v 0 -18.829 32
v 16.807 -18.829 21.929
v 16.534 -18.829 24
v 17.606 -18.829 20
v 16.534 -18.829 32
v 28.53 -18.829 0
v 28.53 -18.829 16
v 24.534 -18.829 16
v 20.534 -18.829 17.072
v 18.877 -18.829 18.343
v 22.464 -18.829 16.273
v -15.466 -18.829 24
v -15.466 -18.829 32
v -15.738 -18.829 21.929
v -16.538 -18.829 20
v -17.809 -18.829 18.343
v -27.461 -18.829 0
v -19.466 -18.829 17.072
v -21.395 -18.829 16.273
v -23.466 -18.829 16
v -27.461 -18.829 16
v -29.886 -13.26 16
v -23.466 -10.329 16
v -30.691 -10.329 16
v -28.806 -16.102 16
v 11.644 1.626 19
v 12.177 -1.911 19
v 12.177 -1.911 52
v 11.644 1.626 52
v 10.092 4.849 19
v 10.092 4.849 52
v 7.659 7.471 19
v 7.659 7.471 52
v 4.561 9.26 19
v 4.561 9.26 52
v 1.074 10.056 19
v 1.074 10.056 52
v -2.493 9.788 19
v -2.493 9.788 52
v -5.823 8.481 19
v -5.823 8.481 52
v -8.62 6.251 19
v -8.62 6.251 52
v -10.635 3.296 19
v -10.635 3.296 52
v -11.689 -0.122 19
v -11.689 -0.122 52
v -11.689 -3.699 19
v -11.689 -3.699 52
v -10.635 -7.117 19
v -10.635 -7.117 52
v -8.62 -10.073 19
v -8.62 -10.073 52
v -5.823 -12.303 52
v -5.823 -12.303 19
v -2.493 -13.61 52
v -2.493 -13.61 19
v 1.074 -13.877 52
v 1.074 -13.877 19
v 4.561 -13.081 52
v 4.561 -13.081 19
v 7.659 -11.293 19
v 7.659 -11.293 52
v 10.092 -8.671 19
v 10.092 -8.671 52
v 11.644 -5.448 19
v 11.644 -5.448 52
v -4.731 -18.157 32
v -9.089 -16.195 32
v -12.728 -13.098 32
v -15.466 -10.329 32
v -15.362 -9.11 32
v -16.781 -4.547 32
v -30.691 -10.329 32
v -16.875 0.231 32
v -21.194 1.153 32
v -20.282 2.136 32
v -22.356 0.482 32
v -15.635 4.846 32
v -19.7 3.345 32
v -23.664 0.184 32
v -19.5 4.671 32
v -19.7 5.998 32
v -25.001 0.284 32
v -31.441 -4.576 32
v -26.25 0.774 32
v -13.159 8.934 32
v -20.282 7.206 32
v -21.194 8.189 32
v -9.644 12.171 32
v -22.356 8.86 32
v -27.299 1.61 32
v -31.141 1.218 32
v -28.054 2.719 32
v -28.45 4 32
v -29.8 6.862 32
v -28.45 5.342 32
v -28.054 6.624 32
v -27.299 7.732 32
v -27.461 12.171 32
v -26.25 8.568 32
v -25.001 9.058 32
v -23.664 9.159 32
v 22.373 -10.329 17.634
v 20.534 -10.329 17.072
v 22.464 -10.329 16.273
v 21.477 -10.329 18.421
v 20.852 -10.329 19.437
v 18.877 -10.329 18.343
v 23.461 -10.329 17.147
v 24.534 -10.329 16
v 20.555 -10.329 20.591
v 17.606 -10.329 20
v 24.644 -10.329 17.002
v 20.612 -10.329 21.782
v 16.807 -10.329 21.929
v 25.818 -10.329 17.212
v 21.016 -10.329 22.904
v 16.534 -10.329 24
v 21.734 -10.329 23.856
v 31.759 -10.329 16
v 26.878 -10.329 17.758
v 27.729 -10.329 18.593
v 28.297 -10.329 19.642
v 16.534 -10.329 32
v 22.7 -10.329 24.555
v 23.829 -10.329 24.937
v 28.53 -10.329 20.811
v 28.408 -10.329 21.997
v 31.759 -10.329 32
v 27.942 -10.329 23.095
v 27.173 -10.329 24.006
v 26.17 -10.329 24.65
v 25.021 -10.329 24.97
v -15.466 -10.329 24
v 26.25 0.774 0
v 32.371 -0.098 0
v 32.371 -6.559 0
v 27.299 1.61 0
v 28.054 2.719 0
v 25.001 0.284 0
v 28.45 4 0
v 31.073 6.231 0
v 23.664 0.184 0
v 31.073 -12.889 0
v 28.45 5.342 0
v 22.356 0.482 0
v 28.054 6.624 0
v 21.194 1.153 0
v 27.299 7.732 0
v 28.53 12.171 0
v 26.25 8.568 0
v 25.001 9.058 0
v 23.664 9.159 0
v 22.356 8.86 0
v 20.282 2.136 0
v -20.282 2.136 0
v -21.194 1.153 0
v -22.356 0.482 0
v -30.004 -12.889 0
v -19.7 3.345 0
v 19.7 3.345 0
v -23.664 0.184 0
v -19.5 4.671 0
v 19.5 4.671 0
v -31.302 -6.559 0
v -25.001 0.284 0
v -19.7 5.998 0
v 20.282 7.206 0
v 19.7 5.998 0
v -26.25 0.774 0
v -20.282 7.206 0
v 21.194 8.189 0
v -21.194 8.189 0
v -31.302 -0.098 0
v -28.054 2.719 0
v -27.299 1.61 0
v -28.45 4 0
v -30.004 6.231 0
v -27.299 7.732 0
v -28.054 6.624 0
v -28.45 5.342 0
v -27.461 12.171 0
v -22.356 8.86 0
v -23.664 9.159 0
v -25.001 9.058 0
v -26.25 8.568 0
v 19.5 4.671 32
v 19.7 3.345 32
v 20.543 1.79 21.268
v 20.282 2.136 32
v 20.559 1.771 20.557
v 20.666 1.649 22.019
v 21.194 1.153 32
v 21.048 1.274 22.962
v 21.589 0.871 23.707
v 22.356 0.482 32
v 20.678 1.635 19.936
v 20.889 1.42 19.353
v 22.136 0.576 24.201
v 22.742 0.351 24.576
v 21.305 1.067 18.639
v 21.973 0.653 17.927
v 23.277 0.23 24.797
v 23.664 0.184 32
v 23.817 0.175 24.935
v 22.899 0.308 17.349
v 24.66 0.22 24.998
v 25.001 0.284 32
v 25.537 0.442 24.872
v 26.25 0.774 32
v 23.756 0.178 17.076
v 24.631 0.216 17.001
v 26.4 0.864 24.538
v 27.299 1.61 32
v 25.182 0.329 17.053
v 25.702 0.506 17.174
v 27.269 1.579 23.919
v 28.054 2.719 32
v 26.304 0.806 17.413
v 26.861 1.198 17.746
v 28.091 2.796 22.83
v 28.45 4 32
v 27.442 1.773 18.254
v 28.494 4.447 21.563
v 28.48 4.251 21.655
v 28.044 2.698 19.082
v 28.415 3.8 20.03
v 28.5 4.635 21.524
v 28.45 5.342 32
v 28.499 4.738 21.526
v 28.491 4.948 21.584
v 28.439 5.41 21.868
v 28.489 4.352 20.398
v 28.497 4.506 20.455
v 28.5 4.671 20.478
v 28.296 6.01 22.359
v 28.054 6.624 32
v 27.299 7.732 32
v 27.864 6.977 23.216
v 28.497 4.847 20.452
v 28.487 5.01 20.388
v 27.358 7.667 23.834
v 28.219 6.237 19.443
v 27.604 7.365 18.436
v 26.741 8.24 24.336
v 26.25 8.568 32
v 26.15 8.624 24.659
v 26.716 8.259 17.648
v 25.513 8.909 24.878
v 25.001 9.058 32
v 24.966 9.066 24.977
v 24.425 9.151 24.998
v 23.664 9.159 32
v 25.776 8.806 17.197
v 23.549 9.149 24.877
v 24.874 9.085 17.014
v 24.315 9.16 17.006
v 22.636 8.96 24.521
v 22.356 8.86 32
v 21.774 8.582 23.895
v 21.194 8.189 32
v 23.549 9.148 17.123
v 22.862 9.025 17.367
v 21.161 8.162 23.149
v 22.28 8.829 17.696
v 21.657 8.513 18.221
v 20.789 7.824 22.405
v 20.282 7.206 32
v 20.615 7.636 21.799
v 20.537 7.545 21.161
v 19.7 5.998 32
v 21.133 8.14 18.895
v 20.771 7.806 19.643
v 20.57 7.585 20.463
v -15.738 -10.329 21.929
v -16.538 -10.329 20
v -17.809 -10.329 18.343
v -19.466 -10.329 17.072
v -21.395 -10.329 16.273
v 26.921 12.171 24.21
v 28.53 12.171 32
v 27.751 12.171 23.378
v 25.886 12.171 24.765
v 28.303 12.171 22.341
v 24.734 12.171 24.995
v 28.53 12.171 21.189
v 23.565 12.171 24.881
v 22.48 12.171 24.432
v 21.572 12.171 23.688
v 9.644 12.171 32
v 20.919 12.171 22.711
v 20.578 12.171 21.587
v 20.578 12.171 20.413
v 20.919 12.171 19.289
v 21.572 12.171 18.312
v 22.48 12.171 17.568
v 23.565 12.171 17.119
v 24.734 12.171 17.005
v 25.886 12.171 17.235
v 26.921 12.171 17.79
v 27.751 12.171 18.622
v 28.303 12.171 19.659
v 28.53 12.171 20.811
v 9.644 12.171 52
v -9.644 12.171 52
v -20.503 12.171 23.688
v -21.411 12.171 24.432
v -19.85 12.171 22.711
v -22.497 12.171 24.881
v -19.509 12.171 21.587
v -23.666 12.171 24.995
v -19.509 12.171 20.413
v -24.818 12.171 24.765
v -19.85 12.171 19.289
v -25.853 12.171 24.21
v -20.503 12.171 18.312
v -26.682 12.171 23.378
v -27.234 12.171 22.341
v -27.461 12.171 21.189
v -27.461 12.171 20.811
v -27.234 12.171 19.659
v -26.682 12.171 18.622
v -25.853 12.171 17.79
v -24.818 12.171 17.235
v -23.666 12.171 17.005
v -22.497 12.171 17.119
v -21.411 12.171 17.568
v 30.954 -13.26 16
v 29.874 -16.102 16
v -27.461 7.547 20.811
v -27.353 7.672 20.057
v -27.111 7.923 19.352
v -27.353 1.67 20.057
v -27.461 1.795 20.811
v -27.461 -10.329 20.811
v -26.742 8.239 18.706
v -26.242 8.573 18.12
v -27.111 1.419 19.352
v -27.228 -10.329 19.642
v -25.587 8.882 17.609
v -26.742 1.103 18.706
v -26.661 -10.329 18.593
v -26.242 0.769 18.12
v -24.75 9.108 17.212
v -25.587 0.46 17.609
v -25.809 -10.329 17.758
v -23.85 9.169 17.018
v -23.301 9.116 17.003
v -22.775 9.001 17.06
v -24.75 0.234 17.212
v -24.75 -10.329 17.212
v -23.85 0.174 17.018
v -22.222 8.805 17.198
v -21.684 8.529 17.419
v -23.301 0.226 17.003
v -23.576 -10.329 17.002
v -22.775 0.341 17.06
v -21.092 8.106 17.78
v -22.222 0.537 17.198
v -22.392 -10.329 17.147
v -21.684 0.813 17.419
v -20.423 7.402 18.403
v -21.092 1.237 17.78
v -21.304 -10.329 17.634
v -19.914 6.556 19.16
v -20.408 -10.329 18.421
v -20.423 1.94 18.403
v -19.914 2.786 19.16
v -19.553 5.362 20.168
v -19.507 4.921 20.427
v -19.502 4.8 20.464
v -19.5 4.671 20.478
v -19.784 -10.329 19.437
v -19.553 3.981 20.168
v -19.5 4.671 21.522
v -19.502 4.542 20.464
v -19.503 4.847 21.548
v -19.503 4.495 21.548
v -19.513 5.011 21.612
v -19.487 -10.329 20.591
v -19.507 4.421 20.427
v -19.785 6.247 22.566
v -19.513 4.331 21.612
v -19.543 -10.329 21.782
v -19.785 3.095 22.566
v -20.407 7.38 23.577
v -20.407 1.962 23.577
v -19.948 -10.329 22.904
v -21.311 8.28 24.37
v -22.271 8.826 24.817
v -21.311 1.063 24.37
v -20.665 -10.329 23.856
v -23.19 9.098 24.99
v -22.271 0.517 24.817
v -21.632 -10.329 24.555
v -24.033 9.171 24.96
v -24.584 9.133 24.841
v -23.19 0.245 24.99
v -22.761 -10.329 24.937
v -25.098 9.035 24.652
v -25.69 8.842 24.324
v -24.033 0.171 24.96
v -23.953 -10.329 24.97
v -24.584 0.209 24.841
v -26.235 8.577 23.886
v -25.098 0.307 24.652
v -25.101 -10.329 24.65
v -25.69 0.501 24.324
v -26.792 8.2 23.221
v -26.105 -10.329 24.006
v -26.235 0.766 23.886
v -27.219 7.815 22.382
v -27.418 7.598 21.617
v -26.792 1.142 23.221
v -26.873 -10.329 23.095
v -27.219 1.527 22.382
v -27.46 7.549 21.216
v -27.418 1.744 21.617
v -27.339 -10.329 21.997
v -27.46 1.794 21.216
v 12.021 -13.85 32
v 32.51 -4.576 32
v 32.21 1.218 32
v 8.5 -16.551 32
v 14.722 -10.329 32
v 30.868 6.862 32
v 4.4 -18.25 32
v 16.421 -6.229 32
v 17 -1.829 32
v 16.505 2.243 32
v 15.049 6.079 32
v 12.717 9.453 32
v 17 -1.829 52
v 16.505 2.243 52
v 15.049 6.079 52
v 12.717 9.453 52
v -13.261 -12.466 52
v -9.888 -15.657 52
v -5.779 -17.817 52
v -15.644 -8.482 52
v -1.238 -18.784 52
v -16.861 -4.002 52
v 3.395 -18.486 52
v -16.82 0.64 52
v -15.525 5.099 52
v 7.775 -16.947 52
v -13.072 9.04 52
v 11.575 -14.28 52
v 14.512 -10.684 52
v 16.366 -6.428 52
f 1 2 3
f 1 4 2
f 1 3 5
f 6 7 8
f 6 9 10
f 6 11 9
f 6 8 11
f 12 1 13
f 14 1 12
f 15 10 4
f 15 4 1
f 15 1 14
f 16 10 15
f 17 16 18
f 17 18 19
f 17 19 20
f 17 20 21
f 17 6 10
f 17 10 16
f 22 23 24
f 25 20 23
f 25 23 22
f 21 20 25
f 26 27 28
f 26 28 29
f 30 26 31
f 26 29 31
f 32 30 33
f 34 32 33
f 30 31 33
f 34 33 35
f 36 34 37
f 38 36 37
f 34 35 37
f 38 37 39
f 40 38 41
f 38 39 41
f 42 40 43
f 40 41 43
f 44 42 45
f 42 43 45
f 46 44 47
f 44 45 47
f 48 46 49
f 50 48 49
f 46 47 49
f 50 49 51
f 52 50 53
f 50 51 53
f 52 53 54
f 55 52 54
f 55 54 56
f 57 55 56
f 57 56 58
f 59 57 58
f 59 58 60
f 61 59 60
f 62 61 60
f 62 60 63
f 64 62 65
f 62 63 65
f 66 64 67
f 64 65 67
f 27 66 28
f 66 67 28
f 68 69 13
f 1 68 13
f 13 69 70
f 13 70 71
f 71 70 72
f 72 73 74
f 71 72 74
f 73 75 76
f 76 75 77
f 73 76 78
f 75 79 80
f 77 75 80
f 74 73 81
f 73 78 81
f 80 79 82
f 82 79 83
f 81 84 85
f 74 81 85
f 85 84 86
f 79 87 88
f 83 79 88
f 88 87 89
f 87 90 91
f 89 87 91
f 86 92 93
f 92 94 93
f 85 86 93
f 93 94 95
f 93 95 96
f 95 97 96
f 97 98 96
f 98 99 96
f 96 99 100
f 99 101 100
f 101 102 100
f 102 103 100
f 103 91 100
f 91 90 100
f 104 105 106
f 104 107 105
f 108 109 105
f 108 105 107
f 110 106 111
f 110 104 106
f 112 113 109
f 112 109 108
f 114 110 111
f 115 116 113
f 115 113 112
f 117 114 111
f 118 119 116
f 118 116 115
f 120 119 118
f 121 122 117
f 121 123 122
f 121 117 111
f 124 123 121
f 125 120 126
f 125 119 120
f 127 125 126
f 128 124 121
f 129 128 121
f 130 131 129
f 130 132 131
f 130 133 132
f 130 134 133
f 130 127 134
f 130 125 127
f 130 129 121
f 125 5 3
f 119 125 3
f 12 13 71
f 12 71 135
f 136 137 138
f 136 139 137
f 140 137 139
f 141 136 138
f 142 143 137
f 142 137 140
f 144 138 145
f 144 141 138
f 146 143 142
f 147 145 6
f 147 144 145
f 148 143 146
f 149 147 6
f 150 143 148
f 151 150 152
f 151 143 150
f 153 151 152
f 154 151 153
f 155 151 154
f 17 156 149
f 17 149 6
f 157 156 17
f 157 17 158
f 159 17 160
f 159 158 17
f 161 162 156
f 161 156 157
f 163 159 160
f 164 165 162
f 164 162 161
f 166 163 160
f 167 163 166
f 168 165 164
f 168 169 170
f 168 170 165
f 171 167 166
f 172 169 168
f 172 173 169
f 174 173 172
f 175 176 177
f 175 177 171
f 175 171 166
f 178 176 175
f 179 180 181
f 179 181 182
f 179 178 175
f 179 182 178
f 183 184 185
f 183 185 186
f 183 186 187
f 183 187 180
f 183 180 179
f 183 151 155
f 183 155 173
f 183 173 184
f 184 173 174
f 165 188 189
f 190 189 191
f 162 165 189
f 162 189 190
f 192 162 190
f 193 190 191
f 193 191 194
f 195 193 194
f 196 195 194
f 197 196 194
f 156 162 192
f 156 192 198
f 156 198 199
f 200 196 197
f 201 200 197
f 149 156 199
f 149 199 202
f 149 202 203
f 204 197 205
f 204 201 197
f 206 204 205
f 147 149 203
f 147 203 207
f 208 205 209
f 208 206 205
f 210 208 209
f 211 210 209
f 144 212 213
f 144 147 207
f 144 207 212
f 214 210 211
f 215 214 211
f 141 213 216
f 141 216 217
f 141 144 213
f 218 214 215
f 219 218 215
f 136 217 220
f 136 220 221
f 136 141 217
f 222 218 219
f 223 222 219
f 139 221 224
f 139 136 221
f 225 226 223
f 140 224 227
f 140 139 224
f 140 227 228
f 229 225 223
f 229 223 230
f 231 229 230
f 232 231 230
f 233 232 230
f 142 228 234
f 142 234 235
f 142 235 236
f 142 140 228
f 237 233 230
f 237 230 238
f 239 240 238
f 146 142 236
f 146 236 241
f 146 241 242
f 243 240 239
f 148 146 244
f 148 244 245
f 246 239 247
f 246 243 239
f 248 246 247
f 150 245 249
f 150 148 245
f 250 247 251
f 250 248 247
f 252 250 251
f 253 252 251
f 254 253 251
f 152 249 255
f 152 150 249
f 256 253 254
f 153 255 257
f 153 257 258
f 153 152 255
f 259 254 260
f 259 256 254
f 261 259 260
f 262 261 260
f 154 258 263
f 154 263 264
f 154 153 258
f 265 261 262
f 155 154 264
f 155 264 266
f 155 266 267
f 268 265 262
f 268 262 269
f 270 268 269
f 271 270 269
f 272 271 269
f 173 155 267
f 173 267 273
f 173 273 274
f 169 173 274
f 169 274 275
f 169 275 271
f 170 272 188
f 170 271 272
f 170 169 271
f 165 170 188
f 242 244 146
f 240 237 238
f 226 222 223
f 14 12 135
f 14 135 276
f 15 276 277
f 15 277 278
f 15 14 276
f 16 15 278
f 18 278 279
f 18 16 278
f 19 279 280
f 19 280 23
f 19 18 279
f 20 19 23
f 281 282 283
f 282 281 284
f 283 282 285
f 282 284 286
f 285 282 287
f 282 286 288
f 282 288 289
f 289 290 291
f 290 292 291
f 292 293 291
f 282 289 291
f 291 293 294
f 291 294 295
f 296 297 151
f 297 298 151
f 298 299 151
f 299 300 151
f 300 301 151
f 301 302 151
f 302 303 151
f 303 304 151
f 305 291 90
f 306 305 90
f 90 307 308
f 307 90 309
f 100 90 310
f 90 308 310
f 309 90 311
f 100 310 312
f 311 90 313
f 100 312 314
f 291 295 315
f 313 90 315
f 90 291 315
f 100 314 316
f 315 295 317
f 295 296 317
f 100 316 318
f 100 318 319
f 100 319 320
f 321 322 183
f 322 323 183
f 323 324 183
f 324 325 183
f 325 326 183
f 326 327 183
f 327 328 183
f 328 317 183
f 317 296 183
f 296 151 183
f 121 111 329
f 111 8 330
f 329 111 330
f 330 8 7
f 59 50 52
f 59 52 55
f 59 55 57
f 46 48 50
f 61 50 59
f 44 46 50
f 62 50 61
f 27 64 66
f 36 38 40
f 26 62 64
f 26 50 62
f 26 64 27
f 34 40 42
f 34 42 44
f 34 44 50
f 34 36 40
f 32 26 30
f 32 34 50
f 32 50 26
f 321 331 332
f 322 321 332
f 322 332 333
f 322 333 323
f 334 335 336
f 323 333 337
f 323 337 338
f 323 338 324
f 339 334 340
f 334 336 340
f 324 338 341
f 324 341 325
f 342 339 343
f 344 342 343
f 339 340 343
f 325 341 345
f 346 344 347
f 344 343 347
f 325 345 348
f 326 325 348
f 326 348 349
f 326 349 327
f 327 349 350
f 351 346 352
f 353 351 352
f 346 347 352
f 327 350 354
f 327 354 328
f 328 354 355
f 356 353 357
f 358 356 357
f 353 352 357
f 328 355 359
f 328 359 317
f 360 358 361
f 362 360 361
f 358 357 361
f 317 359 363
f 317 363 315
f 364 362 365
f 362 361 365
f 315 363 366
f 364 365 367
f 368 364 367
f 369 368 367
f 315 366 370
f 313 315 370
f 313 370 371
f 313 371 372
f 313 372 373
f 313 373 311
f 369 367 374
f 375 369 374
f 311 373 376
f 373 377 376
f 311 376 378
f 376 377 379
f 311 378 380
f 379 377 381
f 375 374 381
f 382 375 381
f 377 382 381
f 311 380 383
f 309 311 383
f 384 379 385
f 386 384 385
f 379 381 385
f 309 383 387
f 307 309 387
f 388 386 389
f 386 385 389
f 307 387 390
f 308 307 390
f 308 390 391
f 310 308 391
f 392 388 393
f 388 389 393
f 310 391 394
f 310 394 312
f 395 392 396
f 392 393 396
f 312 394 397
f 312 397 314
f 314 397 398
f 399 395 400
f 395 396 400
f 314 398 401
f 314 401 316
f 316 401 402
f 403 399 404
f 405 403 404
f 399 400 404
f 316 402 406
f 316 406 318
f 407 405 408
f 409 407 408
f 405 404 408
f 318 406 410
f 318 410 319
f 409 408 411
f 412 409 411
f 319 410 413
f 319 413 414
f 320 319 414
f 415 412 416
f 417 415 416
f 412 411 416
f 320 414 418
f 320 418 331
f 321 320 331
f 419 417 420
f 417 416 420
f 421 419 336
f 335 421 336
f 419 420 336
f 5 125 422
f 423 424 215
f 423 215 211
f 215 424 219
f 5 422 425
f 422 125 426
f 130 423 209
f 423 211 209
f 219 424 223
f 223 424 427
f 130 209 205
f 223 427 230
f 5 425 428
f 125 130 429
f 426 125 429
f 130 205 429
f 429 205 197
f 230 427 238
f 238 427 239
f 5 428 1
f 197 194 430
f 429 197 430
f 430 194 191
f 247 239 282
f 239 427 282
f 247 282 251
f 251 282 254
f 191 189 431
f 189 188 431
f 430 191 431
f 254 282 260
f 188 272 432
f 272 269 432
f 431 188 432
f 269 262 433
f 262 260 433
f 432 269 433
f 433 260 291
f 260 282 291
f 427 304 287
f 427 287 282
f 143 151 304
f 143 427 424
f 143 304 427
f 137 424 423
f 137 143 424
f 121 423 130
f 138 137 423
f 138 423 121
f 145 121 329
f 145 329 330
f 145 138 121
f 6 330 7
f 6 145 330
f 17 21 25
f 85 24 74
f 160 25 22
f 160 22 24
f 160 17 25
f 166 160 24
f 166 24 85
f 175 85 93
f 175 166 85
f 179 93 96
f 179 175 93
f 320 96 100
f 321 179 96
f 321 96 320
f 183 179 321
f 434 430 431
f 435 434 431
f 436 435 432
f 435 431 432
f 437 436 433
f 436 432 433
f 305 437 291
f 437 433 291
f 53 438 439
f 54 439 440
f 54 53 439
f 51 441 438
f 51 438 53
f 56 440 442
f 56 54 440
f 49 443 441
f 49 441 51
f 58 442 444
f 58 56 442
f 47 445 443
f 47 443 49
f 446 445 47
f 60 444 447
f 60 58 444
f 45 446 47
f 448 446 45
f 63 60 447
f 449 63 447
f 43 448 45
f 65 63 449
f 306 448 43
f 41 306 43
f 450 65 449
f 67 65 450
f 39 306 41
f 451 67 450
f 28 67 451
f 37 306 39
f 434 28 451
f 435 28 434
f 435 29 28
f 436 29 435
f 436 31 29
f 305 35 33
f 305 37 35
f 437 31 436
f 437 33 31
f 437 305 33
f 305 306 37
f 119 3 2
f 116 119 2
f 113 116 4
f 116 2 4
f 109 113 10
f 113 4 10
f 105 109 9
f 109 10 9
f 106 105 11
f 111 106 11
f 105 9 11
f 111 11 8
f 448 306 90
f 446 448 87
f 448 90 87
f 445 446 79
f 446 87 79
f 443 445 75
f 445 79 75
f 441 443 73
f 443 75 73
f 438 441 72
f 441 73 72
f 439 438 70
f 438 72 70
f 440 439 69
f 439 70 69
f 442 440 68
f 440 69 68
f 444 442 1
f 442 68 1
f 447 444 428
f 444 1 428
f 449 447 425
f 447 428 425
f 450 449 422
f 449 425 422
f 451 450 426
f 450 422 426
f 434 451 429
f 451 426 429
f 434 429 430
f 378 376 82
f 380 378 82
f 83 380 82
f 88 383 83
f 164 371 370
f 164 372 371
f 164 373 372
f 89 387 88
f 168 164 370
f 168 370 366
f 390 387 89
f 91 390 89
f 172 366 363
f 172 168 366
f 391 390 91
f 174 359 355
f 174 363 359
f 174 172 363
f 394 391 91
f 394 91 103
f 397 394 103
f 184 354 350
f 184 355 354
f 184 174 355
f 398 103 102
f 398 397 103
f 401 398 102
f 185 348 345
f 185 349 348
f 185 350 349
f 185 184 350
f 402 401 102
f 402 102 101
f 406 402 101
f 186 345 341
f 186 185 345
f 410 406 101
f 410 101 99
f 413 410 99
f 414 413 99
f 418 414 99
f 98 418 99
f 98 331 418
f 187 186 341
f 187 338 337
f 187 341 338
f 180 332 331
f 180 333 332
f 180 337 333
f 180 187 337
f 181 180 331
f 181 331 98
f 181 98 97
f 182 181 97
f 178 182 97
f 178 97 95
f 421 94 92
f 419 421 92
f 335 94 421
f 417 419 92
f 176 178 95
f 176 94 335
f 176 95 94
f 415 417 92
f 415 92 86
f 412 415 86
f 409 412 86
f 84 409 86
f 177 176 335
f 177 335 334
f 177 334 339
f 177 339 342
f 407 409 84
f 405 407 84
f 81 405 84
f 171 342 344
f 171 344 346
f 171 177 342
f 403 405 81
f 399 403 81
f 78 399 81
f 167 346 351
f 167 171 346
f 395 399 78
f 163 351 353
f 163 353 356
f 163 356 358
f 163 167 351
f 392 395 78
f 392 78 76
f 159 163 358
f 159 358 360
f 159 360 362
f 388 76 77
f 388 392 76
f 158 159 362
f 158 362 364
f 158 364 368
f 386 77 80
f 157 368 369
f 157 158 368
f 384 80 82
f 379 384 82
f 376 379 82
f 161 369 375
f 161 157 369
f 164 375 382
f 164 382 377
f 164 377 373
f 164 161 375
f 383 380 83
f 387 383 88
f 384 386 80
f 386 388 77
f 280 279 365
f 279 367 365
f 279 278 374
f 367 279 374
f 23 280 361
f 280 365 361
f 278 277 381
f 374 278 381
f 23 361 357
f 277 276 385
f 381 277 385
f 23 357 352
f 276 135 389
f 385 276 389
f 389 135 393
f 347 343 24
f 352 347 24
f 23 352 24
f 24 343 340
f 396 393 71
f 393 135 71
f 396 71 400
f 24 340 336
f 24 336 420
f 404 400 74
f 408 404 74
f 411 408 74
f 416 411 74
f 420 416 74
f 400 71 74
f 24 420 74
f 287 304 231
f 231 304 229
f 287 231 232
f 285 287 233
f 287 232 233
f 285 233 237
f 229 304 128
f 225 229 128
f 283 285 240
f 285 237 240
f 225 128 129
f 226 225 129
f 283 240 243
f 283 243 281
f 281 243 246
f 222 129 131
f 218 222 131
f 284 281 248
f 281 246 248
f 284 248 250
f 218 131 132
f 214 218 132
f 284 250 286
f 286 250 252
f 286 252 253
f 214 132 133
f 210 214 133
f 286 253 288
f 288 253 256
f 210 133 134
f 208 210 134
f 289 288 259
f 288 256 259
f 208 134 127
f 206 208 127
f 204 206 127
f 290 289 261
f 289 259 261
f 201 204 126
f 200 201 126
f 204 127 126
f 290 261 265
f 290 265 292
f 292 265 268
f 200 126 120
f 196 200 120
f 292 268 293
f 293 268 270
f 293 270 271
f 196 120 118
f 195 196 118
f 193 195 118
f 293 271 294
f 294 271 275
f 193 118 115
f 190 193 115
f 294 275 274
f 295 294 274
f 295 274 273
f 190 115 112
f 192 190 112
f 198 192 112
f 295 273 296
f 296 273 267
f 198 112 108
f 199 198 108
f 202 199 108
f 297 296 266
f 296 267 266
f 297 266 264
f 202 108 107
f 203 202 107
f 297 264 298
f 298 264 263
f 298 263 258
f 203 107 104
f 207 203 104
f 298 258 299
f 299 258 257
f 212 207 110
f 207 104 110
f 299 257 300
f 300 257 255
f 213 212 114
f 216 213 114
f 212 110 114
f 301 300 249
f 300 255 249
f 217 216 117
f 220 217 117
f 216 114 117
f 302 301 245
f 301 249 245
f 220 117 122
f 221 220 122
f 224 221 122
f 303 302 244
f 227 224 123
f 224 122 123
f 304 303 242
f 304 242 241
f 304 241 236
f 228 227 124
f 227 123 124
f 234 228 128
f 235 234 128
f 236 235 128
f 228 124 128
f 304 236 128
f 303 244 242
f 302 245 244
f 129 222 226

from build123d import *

# Parameters (mm, degrees)
BOSS_EXTRU_1_DEPTH      = 32
ESQUISSE2_R             = 4
ENL_V_MAT_EXTRU_1_DEPTH = 32
ESQUISSE3_R             = 4.5
ENL_V_MAT_EXTRU_3_DEPTH = 42
ENL_V_MAT_EXTRU_4_DEPTH = 8.5
BOSS_EXTRU_2_DEPTH      = 20
ESQUISSE7_R             = 12
ENL_V_MAT_EXTRU_5_DEPTH = 33


with BuildPart() as part:
    # Esquisse1 → Boss.-Extru.1 (new body)
    with BuildSketch(Plane.XY):
        with BuildLine():
            Line((-27.461265237, 12.171141476), (28.529805479, 12.171141476))
            ThreePointArc((28.529805479, 12.171141476), (32.534270121, -3.328858524), (28.529805479, -18.828858524))
            Line((28.529805479, -18.828858524), (-27.461265237, -18.828858524))
            ThreePointArc((-27.461265237, -18.828858524), (-31.465729879, -3.328858524), (-27.461265237, 12.171141476))
        make_face()
    extrude(amount=BOSS_EXTRU_1_DEPTH)

    # Esquisse2 → Enlèv. mat.-Extru.1 (cut)
    with BuildSketch(Plane.XZ.offset(18.828858524)):
        with Locations(Location((24.534270121, 21, 0), (0, 0, 357.292669089))):
            Circle(ESQUISSE2_R)
        with Locations(Location((-23.465729879, 21, 0), (0, 0, 182.707330911))):
            Circle(ESQUISSE2_R)
    extrude(amount=-ENL_V_MAT_EXTRU_1_DEPTH, mode=Mode.SUBTRACT)

    # Esquisse3 → Enlèv. mat.-Extru.3 (cut)
    with BuildSketch(Plane.XY):
        with Locations((-24, 4.671141476)):
            Circle(ESQUISSE3_R)
        with Locations(Location((24, 4.671141476, 0), (0, 0, 180))):
            Circle(ESQUISSE3_R)
    extrude(amount=ENL_V_MAT_EXTRU_3_DEPTH, mode=Mode.SUBTRACT)

    # Esquisse5 → Enlèv. mat.-Extru.4 (cut)
    with BuildSketch(Plane.XZ.offset(18.828858524)):
        with BuildLine():
            Line((-15.465729879, 32), (-15.465729879, 24))
            ThreePointArc((-15.465729879, 24), (-17.80887563, 18.343145751), (-23.465729879, 16))
            Line((-23.465729879, 16), (-31.465729879, 16))
            Line((-31.465729879, 16), (-31.465729879, 32))
            Line((-31.465729879, 32), (-15.465729879, 32))
        make_face()
        with BuildLine():
            Line((24.534270121, 16), (32.534270121, 16))
            Line((32.534270121, 16), (32.534270121, 32))
            Line((32.534270121, 32), (16.534270121, 32))
            Line((16.534270121, 32), (16.534270121, 24))
            ThreePointArc((16.534270121, 24), (18.877415871, 18.343145751), (24.534270121, 16))
        make_face()
    extrude(amount=-ENL_V_MAT_EXTRU_4_DEPTH, mode=Mode.SUBTRACT)

    # Esquisse6 → Boss.-Extru.2 (add)
    with BuildSketch(Plane.XY.offset(32)):
        with BuildLine():
            Line((9.643650761, 12.171141476), (-9.643650761, 12.171141476))
            ThreePointArc((-9.643650761, 12.171141476), (-7.907526069, -16.877813022), (17, -1.828858524))
            ThreePointArc((17, -1.828858524), (15.048954498, 6.078667545), (9.643650761, 12.171141476))
        make_face()
    extrude(amount=BOSS_EXTRU_2_DEPTH)

    # Esquisse7 → Enlèv. mat.-Extru.5 (cut)
    with BuildSketch(Plane.XY.offset(52)):
        with Locations((0.177122326, -1.910835069)):
            Circle(ESQUISSE7_R)
    extrude(amount=-ENL_V_MAT_EXTRU_5_DEPTH, mode=Mode.SUBTRACT)


solid = part.part
